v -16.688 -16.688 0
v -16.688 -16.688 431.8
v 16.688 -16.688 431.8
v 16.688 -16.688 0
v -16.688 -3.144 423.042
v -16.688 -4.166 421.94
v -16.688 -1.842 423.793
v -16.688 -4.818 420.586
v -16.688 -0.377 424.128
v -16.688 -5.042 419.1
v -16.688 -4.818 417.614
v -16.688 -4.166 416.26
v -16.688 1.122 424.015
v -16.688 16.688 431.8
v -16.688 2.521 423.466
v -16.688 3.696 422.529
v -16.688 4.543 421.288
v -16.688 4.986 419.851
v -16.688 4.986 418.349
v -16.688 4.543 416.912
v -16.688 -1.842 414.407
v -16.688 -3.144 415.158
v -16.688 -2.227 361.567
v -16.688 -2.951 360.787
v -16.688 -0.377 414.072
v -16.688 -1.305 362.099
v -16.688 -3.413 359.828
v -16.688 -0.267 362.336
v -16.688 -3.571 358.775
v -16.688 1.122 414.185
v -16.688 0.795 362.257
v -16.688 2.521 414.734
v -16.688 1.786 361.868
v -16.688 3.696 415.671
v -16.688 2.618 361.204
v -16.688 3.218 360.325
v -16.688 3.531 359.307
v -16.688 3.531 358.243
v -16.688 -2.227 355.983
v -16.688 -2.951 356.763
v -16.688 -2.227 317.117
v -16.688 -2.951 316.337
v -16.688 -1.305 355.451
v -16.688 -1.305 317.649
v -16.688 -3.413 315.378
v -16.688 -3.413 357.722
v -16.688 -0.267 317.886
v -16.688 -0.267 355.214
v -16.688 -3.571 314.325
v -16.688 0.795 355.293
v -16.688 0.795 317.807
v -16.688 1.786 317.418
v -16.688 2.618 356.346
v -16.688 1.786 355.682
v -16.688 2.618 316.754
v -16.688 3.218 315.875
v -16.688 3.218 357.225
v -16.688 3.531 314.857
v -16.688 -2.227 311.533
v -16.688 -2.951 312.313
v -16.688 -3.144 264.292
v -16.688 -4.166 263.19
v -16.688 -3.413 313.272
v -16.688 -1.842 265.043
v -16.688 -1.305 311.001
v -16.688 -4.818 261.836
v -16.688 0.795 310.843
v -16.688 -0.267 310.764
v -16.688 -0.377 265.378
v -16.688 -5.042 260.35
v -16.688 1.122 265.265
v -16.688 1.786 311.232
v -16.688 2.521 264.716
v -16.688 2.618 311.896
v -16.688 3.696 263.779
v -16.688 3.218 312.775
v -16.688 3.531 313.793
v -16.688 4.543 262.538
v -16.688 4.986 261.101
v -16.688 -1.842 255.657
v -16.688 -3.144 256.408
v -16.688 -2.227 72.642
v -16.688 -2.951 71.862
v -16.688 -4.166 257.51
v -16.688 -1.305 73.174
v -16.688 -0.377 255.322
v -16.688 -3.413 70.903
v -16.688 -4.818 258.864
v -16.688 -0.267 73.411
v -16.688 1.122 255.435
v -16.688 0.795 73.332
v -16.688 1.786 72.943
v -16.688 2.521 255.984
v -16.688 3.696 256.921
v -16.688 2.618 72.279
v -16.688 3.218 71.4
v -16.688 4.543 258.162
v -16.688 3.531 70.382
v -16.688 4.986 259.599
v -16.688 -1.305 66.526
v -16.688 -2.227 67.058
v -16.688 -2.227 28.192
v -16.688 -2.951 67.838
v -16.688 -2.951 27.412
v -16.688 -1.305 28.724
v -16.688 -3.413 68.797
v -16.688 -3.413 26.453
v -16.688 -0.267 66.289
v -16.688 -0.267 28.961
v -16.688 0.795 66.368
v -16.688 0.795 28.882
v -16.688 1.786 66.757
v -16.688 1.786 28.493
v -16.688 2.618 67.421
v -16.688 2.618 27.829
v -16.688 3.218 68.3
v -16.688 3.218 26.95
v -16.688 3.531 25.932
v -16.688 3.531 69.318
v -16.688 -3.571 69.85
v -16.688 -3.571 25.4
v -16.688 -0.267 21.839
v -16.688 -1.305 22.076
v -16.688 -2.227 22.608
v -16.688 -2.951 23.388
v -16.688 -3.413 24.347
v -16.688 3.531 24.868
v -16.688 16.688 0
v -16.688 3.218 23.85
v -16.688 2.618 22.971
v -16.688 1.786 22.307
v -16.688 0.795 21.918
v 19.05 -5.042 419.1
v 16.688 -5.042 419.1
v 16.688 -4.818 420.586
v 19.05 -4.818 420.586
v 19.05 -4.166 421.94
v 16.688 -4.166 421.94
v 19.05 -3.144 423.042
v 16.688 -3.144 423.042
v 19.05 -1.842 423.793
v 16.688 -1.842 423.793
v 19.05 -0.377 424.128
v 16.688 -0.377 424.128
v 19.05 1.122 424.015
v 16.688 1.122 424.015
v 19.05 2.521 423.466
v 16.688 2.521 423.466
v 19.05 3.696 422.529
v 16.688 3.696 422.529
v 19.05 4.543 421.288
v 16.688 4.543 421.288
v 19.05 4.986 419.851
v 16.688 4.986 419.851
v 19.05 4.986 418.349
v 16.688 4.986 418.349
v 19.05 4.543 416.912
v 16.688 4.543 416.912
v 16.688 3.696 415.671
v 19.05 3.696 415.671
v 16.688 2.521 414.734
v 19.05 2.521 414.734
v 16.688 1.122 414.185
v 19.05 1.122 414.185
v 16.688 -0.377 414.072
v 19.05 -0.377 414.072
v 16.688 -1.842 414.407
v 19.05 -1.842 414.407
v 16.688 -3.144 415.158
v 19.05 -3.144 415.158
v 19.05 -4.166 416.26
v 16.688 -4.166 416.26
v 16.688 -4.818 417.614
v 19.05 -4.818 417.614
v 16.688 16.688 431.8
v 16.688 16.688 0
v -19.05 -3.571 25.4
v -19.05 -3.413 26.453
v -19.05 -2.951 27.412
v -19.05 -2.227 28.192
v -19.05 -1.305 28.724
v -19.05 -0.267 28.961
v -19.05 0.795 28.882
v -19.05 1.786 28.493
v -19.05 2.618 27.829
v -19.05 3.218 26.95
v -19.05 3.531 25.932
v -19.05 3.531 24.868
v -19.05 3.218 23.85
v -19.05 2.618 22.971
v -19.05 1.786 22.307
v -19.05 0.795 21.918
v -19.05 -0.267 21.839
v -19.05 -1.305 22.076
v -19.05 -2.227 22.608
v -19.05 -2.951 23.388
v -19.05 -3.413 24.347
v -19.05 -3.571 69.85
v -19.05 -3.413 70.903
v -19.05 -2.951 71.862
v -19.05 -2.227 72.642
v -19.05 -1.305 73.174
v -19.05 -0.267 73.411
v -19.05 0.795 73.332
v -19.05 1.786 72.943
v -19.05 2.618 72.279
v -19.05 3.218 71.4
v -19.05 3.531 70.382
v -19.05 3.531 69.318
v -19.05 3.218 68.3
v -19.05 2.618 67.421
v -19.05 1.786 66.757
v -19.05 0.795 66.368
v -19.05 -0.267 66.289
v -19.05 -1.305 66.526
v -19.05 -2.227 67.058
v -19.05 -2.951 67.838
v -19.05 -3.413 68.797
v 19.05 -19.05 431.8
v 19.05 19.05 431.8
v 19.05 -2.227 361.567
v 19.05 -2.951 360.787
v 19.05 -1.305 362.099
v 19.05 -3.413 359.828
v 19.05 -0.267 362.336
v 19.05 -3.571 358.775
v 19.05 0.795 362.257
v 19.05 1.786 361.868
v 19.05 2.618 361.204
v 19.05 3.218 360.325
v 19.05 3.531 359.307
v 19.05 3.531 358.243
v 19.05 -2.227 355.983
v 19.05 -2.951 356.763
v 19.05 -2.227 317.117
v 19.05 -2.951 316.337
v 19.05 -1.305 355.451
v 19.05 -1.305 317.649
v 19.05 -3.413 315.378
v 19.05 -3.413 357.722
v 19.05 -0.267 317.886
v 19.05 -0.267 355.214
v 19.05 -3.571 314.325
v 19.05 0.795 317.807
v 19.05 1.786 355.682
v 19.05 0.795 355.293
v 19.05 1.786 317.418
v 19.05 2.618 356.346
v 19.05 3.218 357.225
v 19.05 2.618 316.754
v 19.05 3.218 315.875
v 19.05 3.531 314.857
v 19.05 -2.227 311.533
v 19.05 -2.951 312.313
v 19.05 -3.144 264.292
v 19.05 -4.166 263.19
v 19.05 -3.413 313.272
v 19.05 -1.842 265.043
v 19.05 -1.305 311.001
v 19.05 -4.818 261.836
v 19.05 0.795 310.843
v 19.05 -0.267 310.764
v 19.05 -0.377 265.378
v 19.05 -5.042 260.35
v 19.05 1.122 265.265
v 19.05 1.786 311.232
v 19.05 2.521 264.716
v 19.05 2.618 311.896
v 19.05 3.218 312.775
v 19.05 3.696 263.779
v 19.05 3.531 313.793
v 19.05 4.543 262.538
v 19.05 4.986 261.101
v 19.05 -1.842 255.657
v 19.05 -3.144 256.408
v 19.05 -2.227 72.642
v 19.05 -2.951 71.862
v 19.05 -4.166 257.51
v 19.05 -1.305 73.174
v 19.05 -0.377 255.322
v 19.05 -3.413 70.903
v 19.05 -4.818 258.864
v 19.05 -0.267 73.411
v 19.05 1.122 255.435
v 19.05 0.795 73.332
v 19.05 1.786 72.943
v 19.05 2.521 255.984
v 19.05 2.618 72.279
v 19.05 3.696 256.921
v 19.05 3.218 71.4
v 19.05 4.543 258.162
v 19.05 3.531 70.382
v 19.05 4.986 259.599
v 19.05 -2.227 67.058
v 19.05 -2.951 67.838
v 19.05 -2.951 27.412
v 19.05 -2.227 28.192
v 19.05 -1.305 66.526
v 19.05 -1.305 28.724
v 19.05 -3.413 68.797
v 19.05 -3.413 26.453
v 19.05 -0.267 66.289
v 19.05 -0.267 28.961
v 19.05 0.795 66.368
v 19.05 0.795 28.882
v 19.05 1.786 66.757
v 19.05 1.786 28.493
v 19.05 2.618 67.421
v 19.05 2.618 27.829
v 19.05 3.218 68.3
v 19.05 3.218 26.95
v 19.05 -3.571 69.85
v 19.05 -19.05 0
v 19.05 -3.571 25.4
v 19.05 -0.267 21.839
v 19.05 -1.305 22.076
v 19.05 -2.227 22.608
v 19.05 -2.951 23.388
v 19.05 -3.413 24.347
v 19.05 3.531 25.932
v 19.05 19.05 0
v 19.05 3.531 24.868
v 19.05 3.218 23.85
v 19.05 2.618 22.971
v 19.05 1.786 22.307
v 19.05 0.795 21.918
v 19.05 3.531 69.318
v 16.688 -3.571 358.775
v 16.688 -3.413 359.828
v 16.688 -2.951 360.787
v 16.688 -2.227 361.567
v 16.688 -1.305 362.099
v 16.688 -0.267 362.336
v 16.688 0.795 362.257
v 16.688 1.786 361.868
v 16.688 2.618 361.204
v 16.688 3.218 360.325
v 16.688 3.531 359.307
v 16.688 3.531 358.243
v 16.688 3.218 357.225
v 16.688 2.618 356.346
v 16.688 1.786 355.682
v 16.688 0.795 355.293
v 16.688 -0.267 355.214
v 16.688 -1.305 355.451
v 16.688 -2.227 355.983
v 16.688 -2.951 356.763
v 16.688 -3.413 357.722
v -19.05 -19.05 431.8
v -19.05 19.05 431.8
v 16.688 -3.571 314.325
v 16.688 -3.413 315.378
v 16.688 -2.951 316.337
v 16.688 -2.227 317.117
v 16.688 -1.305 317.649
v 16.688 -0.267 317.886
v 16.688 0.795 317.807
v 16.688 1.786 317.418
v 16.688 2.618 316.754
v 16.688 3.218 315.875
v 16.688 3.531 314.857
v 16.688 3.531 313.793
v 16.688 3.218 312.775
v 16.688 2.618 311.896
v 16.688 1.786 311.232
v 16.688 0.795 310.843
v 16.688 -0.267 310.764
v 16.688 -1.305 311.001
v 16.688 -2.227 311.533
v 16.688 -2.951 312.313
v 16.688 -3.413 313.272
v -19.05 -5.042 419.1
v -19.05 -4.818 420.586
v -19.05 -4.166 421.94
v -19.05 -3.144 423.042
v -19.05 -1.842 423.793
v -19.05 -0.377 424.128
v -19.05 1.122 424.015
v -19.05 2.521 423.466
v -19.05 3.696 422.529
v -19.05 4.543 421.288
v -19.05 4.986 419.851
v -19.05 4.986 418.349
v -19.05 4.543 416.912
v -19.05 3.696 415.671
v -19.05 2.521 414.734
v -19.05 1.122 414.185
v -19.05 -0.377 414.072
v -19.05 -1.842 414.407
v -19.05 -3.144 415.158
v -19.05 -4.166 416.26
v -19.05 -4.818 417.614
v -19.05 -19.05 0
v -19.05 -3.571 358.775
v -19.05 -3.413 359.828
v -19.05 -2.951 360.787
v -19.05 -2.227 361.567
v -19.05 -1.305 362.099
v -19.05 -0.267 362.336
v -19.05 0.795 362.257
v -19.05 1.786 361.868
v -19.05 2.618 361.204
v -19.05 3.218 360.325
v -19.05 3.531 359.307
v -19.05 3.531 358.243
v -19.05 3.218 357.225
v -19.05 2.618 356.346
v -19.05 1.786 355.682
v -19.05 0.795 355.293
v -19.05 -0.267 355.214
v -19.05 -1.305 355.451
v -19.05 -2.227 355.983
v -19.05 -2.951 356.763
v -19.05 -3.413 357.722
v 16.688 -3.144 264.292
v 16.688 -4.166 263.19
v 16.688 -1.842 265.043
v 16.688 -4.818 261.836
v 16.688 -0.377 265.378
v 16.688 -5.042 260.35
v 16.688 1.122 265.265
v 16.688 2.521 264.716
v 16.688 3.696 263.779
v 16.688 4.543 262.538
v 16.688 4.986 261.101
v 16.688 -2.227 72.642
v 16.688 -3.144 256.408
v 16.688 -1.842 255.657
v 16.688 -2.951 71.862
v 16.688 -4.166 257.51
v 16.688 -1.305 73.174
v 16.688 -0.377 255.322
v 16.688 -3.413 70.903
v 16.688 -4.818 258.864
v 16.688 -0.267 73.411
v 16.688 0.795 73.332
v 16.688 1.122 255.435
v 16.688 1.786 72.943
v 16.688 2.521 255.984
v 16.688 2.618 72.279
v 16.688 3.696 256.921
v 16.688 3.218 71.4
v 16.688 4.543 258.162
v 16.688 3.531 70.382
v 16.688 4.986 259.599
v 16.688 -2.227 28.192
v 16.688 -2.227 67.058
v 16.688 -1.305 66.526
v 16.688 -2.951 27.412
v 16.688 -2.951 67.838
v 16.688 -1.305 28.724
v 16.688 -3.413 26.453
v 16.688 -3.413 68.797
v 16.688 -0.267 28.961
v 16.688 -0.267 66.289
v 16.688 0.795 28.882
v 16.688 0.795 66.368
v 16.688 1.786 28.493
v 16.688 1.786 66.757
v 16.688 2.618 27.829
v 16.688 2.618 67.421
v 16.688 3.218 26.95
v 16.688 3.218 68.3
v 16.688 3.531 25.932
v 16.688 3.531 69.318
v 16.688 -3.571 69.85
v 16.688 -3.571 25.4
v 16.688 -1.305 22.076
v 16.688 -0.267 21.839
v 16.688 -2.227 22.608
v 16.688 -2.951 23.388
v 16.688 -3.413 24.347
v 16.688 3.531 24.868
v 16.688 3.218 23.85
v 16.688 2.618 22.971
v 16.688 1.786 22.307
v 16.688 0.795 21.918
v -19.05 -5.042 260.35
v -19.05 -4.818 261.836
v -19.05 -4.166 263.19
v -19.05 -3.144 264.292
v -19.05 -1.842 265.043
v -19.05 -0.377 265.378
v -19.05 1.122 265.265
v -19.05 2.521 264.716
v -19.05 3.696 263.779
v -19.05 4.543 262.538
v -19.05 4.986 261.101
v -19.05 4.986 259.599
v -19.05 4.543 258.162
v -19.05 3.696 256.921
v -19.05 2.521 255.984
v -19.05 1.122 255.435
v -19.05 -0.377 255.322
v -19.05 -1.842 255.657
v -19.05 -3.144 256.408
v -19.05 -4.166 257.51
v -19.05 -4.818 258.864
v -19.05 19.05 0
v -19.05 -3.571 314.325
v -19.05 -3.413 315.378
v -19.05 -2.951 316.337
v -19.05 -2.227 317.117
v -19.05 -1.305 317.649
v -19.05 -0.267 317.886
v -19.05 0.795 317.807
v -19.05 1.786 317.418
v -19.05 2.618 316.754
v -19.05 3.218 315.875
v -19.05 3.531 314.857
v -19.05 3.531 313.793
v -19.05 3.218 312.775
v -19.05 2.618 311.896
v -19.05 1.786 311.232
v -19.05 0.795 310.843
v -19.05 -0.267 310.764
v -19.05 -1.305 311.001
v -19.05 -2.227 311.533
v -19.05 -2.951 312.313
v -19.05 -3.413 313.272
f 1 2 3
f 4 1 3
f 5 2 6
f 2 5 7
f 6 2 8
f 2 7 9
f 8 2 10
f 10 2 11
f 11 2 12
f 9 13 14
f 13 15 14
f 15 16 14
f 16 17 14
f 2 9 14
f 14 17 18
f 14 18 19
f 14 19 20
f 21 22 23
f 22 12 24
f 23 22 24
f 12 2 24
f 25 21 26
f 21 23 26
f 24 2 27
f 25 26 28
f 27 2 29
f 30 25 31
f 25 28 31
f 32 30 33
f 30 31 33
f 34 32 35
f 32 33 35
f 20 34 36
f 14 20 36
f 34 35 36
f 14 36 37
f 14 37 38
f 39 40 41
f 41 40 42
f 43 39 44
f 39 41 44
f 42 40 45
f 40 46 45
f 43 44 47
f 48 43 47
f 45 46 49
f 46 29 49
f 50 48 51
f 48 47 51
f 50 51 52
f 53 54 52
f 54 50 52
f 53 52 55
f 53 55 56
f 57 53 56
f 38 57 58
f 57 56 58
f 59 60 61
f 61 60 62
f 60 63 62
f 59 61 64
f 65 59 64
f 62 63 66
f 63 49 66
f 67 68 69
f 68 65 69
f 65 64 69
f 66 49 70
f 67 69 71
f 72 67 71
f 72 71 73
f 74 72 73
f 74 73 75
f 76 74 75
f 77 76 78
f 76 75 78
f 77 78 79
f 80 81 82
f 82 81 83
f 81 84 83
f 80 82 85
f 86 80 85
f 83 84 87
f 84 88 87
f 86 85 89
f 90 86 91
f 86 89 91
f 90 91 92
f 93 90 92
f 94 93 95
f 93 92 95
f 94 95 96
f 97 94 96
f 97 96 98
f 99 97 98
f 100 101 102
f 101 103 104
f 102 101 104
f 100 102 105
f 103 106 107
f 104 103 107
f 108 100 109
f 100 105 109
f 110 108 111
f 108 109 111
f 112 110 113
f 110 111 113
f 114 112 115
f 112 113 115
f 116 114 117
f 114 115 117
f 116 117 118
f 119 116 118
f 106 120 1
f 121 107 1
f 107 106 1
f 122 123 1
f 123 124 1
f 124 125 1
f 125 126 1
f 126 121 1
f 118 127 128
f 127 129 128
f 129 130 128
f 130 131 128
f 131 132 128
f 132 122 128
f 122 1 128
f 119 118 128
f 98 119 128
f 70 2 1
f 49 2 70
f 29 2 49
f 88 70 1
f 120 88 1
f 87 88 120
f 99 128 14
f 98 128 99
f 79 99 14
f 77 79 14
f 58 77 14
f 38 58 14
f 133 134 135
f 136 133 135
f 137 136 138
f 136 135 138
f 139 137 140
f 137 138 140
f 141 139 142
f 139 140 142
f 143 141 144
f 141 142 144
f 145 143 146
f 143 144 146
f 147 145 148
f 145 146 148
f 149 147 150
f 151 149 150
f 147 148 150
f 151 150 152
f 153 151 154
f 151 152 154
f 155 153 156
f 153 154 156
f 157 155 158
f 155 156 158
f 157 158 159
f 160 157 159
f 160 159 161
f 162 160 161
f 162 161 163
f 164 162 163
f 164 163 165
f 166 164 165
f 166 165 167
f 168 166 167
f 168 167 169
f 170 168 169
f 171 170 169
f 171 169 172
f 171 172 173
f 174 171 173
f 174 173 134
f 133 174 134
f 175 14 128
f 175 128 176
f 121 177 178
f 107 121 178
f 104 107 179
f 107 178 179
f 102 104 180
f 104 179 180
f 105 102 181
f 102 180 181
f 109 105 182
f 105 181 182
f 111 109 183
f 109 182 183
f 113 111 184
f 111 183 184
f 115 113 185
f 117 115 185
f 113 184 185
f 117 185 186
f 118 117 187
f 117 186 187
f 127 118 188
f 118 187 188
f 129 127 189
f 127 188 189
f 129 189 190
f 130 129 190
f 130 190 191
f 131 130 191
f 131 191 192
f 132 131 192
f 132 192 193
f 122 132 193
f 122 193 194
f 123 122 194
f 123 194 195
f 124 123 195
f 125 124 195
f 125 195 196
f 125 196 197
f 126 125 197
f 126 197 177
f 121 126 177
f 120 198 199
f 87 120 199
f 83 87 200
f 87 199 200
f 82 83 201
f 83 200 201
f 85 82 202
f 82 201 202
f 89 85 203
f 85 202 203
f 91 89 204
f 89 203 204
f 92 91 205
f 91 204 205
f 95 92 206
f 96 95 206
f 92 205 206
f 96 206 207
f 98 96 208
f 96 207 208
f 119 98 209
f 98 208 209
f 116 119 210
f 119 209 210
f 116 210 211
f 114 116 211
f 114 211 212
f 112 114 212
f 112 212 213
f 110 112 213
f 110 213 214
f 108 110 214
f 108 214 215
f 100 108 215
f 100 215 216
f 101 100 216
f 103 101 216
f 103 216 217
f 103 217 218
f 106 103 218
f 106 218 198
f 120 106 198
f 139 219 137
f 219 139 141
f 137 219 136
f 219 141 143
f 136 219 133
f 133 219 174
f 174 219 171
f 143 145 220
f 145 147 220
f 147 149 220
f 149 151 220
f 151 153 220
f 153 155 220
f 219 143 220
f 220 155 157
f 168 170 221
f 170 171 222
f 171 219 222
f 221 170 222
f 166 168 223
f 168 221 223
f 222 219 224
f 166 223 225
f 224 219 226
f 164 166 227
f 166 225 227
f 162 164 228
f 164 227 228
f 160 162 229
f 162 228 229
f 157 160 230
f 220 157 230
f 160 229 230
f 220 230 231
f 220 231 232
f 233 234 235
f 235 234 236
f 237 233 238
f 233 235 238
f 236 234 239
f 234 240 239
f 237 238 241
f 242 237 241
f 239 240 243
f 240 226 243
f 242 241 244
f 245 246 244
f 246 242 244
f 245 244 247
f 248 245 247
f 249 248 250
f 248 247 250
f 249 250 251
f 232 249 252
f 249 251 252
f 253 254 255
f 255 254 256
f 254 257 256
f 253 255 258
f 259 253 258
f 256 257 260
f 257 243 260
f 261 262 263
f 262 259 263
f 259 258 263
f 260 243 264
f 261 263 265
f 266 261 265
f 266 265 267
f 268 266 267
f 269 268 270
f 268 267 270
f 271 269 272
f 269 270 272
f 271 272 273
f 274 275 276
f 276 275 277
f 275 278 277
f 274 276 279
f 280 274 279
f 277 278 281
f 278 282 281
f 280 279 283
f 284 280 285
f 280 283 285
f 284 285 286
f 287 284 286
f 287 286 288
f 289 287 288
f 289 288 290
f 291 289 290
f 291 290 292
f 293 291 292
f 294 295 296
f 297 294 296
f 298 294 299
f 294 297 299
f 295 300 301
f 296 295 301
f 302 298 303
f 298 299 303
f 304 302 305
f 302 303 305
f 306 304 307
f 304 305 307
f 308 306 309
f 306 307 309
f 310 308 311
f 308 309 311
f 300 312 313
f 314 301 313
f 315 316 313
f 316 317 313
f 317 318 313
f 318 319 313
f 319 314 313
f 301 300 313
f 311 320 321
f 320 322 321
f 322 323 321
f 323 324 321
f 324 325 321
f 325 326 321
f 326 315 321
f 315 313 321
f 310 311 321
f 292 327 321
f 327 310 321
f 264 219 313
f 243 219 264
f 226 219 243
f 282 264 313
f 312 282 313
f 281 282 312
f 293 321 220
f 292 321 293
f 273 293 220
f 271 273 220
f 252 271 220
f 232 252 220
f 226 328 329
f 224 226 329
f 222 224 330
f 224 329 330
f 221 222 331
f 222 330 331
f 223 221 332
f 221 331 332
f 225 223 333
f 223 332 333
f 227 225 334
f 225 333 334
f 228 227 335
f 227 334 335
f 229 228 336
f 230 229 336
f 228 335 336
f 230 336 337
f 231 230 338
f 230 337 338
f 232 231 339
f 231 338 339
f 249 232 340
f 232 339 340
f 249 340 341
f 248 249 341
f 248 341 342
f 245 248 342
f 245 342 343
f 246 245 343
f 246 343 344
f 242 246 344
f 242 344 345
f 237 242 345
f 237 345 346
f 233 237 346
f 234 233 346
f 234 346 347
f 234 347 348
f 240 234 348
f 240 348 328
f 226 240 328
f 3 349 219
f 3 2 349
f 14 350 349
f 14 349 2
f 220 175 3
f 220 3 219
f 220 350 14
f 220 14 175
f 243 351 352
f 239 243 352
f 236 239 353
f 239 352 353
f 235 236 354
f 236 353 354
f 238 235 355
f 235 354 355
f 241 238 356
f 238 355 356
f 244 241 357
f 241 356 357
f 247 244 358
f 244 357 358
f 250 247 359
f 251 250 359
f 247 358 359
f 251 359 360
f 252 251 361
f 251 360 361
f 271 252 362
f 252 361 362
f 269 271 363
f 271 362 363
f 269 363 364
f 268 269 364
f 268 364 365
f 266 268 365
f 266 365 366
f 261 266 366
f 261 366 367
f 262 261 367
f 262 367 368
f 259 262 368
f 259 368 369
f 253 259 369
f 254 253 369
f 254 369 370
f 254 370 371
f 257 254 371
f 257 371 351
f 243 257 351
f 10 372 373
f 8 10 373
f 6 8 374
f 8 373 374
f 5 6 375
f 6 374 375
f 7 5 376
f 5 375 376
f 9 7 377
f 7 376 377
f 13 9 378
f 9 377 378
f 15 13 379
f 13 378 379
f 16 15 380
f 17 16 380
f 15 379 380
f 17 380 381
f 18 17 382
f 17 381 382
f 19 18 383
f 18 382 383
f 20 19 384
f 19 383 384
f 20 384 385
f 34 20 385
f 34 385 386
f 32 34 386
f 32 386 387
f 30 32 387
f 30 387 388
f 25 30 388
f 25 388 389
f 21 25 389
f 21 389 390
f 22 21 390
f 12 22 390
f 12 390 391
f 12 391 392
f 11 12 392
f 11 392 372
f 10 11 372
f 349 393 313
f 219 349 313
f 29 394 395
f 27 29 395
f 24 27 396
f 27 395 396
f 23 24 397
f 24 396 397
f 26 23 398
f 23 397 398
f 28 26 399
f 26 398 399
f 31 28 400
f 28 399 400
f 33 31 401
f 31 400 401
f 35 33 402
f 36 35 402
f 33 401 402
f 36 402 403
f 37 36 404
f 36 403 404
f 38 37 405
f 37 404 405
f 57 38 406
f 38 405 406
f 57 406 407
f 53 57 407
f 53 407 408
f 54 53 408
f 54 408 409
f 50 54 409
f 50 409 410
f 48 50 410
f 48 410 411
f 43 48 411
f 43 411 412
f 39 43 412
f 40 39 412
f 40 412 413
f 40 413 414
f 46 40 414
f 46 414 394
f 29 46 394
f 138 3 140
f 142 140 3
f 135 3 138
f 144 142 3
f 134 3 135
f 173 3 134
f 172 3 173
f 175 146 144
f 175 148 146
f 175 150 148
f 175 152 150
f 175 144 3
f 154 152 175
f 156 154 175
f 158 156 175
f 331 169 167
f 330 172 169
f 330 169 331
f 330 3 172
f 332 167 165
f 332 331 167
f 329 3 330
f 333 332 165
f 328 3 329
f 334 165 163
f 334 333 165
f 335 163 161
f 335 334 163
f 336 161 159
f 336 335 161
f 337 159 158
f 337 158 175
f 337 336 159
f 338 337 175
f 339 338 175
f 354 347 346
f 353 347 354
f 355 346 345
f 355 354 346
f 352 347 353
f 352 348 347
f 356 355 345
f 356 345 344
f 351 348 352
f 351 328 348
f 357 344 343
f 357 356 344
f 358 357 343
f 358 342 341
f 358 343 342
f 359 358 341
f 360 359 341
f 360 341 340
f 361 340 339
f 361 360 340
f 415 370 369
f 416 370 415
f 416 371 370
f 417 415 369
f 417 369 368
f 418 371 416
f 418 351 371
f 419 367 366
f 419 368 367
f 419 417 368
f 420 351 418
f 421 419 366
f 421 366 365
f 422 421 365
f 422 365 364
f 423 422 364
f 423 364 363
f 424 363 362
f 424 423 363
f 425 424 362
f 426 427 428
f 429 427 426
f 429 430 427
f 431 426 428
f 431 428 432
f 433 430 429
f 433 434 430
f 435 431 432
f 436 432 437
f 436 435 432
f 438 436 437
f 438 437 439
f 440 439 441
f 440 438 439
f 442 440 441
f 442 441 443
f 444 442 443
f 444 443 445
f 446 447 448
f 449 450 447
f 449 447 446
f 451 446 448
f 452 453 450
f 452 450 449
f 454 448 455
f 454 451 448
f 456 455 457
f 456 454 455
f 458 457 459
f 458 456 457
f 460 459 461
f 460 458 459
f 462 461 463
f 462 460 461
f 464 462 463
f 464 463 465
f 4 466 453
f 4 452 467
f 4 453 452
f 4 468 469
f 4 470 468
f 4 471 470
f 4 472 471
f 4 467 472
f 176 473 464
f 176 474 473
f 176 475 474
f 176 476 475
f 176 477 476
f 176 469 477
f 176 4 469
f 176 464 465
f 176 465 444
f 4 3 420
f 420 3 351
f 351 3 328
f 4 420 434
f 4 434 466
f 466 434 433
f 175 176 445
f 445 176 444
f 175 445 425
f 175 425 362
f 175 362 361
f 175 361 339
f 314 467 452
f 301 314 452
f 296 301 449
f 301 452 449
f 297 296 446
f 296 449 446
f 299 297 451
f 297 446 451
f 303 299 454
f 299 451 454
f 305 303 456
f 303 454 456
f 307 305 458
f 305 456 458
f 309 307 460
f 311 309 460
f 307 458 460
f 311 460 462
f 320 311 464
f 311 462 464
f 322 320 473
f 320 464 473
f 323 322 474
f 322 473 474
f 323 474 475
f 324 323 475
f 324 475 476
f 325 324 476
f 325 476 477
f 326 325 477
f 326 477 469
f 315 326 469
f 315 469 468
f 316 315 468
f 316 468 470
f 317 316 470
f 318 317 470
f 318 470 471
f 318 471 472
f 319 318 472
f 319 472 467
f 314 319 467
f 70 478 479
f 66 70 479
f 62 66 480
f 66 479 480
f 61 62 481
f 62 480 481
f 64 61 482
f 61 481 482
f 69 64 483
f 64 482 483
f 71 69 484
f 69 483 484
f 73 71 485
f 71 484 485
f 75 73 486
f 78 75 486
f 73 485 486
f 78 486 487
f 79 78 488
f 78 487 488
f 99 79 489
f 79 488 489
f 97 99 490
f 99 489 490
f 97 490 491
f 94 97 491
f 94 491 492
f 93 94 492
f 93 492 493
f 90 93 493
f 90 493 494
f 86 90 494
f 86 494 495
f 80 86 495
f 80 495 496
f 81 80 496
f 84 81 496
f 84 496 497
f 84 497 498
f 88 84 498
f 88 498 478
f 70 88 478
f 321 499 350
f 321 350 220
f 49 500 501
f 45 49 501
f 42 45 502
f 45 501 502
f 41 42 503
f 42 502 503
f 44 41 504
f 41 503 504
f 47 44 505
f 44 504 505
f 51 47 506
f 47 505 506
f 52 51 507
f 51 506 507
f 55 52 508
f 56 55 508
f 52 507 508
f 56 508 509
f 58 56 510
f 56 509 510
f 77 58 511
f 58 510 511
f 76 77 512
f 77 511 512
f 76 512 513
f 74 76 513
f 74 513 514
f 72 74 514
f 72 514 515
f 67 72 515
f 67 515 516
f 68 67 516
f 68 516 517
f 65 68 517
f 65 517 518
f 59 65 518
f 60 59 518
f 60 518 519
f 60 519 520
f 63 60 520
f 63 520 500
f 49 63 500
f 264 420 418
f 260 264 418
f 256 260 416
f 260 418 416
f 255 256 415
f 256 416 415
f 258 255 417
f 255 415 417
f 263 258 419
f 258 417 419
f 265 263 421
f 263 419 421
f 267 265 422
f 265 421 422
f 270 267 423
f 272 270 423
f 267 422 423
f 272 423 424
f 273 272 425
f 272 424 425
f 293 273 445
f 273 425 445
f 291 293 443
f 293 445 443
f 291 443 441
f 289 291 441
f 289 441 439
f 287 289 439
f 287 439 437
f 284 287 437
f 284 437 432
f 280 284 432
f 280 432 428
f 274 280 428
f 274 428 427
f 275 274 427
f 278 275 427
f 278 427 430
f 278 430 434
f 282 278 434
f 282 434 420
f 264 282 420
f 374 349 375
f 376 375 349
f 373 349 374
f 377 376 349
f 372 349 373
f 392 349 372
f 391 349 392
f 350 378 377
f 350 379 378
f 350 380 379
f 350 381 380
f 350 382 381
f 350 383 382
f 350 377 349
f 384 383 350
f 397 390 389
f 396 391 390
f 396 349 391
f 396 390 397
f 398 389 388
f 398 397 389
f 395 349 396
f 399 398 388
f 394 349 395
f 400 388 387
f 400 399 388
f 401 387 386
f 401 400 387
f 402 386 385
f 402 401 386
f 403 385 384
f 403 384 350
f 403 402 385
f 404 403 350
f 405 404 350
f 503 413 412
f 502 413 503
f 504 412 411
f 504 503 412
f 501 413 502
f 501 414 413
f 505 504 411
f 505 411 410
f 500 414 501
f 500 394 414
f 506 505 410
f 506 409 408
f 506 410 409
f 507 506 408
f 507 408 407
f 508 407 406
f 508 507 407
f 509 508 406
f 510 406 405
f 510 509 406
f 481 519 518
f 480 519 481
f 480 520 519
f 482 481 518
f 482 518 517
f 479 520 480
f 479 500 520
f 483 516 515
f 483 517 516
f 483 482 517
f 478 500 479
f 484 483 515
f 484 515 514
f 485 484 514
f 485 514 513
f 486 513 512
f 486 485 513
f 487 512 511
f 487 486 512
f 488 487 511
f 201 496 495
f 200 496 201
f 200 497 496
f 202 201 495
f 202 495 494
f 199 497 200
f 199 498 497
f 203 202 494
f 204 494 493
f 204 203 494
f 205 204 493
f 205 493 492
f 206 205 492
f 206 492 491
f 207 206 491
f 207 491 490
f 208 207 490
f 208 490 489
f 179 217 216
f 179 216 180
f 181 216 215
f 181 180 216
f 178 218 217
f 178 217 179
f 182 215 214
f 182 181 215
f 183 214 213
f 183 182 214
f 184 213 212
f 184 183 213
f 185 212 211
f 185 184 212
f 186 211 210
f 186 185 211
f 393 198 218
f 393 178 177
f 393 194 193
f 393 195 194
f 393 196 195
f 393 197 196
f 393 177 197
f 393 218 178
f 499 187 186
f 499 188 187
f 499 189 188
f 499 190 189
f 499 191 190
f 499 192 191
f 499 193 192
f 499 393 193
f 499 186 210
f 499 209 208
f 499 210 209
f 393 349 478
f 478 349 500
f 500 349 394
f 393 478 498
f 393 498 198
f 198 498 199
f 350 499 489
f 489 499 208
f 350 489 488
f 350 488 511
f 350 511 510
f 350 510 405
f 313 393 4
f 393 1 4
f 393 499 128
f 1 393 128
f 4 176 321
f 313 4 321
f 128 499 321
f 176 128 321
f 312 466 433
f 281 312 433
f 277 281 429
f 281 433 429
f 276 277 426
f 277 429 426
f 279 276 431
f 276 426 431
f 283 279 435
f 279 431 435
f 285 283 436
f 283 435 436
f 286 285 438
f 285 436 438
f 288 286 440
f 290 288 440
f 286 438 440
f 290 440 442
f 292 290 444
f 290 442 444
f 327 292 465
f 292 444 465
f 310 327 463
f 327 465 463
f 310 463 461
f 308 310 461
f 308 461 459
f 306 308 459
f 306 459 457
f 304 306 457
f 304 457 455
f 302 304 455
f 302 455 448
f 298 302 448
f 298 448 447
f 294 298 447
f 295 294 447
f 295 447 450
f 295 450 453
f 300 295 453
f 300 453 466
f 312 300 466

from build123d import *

# Parameters (mm, degrees)
SKETCH1_W               = 38.1
SKETCH1_H               = 38.1
SKETCH1_W_2             = 33.3756
SKETCH1_H_2             = 33.3756
EXTRUDE1_DEPTH          = 431.8
F_1_4_CLEARANCE_HOLE1_D = 7.14248
F_3_8_CLEARANCE_HOLE1_D = 10.0838


with BuildPart() as part:
    # Sketch1 → Extrude1 (new body)
    with BuildSketch(Plane.XY):
        Rectangle(SKETCH1_W, SKETCH1_H)
        Rectangle(SKETCH1_W_2, SKETCH1_H_2, mode=Mode.SUBTRACT)
    extrude(amount=EXTRUDE1_DEPTH)

    # 1/4 Clearance Hole1 (through all)
    with Locations(Plane(origin=(19.05, 0, 358.775), x_dir=(0, 1, 0), z_dir=(1, 0, 0))):
        with Locations((0, 0), (0, -44.45), (0, -288.925), (0, -333.375)):
            Hole(F_1_4_CLEARANCE_HOLE1_D / 2)

    # 3/8 Clearance Hole1 (through all)
    with Locations(Plane(origin=(19.05, 0, 419.1), x_dir=(0, 1, 0), z_dir=(1, 0, 0))):
        with Locations((0, 0), (0, -158.75)):
            Hole(F_3_8_CLEARANCE_HOLE1_D / 2)


solid = part.part
